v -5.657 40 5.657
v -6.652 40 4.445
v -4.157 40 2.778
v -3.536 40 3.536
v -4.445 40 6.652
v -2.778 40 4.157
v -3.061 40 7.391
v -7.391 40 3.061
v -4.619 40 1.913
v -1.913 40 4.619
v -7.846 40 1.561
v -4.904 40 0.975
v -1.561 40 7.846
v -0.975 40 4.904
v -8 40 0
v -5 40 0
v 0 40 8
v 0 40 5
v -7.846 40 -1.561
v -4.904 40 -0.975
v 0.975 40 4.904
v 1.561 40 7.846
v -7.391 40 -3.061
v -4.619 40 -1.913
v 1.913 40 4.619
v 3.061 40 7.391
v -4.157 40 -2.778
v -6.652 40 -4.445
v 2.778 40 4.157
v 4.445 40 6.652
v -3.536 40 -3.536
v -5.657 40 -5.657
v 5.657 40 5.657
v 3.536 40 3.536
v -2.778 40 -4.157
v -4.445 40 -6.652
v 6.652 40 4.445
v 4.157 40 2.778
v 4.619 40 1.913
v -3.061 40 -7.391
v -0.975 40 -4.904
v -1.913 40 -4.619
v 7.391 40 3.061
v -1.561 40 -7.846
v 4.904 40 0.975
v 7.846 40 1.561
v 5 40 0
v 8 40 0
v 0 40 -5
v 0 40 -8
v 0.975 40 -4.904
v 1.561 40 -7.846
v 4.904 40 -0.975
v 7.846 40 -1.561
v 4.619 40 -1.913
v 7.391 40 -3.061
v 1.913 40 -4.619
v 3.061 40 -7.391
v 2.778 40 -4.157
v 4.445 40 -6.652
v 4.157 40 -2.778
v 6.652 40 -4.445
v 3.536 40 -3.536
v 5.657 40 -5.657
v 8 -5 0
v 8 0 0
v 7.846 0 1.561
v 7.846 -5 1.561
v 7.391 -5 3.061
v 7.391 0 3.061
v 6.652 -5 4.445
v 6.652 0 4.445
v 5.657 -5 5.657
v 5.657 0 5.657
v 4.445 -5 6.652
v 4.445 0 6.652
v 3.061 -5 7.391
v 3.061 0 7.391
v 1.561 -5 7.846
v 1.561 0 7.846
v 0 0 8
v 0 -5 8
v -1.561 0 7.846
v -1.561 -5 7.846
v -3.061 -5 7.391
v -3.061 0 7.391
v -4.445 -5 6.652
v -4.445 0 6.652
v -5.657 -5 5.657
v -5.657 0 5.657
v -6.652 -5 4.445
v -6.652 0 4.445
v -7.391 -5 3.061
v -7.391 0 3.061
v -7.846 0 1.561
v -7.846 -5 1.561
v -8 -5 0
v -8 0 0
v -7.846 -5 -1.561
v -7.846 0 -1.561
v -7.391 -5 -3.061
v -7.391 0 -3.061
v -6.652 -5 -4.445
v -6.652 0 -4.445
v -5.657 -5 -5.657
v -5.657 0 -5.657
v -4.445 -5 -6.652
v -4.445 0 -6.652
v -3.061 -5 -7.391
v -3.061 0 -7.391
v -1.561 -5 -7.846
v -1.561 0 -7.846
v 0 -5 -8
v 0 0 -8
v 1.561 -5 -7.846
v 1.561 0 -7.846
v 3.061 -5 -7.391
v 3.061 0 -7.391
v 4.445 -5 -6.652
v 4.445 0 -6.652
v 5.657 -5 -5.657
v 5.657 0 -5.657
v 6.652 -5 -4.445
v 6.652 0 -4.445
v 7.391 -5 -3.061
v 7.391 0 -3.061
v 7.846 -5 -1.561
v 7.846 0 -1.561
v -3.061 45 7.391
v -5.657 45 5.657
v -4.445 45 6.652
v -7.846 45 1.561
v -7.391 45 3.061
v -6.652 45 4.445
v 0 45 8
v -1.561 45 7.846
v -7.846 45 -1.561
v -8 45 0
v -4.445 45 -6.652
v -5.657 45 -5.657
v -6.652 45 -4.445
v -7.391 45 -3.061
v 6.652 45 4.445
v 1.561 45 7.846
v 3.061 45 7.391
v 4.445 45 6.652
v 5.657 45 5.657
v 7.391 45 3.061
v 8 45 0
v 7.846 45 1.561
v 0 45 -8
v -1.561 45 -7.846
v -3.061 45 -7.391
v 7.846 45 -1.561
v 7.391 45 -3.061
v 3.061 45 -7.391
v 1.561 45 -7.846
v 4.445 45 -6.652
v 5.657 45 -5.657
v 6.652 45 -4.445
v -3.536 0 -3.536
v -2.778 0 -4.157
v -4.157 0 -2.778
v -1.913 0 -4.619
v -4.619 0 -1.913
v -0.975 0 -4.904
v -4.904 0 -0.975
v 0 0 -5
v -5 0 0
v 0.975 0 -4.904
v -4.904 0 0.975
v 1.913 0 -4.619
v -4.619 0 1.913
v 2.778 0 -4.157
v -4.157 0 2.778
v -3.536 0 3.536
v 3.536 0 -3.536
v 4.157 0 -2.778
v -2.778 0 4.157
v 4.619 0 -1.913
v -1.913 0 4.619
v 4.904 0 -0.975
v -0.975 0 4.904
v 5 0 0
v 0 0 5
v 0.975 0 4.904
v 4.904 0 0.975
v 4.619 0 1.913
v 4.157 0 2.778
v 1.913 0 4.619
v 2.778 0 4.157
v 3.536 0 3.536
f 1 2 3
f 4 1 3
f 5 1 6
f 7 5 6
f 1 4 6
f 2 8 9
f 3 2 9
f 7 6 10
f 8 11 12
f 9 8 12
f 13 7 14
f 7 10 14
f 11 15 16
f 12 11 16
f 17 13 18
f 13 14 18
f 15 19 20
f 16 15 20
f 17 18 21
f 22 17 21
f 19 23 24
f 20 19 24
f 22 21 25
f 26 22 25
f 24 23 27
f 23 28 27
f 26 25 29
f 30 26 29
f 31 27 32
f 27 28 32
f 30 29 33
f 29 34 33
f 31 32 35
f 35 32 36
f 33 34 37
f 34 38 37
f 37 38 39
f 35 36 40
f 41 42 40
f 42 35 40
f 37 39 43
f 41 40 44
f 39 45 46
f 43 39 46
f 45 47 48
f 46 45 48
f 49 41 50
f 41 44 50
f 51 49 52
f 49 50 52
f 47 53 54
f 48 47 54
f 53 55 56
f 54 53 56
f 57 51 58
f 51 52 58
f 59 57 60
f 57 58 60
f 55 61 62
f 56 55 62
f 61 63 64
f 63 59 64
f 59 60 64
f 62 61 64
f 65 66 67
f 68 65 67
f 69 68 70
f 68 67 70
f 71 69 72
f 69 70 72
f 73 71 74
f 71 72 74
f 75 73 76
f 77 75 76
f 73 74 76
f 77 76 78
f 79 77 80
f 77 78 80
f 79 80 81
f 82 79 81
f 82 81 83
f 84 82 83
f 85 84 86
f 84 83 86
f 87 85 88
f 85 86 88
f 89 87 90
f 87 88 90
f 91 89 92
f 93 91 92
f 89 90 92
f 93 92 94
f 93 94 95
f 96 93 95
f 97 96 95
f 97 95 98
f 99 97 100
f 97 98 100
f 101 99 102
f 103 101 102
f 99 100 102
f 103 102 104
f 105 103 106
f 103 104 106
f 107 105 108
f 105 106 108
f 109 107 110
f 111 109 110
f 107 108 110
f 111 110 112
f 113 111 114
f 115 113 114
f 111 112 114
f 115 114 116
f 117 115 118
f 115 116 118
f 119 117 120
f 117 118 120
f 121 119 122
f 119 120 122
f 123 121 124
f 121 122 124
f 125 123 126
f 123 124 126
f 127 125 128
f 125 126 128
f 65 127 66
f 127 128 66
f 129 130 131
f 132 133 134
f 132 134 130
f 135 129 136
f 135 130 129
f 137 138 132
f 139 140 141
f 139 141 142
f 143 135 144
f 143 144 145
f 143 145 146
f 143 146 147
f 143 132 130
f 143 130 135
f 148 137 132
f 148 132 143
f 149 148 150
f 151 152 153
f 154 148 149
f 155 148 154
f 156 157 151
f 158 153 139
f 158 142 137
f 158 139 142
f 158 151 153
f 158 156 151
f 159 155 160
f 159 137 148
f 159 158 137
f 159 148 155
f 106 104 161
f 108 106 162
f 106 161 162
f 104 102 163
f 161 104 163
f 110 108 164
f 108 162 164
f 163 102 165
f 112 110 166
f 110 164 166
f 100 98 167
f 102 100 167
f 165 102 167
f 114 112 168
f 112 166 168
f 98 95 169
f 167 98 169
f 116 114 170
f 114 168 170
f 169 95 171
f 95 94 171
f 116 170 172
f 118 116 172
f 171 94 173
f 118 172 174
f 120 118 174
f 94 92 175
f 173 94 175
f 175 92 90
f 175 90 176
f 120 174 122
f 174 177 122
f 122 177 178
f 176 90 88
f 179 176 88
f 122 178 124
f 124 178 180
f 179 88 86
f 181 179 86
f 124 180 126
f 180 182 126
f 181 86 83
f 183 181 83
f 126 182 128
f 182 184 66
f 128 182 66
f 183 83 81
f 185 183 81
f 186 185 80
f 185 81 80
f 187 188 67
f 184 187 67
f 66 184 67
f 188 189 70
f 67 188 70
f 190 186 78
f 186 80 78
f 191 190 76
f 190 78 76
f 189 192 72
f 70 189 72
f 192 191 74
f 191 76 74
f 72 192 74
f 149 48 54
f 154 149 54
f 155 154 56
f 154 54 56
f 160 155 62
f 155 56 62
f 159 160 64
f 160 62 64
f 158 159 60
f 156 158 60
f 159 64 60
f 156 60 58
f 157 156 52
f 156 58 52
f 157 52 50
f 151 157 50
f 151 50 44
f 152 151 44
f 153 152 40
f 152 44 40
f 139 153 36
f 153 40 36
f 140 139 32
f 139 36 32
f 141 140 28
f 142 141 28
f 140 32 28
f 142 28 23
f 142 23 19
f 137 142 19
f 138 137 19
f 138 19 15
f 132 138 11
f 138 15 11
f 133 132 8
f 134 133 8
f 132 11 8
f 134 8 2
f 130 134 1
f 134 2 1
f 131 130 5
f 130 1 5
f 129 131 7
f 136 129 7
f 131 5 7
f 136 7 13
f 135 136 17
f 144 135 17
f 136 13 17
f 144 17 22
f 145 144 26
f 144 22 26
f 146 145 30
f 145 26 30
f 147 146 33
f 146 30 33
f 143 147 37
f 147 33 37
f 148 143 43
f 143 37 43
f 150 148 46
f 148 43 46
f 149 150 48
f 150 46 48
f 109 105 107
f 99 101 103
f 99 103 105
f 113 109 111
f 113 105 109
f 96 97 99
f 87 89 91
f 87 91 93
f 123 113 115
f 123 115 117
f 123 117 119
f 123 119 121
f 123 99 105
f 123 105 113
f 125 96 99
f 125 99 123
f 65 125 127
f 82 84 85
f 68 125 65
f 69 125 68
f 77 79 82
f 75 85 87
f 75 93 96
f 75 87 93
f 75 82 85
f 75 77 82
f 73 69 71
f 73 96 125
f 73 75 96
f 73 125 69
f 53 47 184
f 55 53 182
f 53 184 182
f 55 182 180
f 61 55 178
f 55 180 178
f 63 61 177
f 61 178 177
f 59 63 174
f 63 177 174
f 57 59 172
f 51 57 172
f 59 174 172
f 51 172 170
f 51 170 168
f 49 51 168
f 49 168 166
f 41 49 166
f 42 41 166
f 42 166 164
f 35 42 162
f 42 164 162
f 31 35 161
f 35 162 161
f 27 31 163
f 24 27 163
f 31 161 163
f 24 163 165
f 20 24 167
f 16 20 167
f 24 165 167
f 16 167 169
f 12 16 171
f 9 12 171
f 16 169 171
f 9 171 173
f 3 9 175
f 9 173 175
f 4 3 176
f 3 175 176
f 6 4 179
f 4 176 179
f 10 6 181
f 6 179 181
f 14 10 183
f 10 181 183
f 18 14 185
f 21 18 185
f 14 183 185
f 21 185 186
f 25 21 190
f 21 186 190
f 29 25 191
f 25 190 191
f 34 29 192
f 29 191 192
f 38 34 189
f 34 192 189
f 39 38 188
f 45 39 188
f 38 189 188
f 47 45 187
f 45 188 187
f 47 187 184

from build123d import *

# Parameters (mm, degrees)
SZKIC1_R                    = 5
DODANIE_WYCI_GNI_CIE1_DEPTH = 40
SZKIC3_R                    = 8
DODANIE_WYCI_GNI_CIE2_DEPTH = 5
SZKIC2_R                    = 8
DODANIE_WYCI_GNI_CIE3_DEPTH = 5


with BuildPart() as part:
    # Szkic1 → Dodanie-wyciągnięcie1 (new body)
    with BuildSketch(Plane(origin=(0, 0, 0), x_dir=(1, 0, 0), z_dir=(0, 1, 0))):
        Circle(SZKIC1_R)
    extrude(amount=DODANIE_WYCI_GNI_CIE1_DEPTH)

    # Szkic3 → Dodanie-wyciągnięcie2 (add)
    with BuildSketch(Plane.XZ):
        Circle(SZKIC3_R)
    extrude(amount=DODANIE_WYCI_GNI_CIE2_DEPTH)

    # Szkic2 → Dodanie-wyciągnięcie3 (add)
    with BuildSketch(Plane(origin=(0, 40, 0), x_dir=(1, 0, 0), z_dir=(0, 1, 0))):
        Circle(SZKIC2_R)
    extrude(amount=DODANIE_WYCI_GNI_CIE3_DEPTH)


solid = part.part
